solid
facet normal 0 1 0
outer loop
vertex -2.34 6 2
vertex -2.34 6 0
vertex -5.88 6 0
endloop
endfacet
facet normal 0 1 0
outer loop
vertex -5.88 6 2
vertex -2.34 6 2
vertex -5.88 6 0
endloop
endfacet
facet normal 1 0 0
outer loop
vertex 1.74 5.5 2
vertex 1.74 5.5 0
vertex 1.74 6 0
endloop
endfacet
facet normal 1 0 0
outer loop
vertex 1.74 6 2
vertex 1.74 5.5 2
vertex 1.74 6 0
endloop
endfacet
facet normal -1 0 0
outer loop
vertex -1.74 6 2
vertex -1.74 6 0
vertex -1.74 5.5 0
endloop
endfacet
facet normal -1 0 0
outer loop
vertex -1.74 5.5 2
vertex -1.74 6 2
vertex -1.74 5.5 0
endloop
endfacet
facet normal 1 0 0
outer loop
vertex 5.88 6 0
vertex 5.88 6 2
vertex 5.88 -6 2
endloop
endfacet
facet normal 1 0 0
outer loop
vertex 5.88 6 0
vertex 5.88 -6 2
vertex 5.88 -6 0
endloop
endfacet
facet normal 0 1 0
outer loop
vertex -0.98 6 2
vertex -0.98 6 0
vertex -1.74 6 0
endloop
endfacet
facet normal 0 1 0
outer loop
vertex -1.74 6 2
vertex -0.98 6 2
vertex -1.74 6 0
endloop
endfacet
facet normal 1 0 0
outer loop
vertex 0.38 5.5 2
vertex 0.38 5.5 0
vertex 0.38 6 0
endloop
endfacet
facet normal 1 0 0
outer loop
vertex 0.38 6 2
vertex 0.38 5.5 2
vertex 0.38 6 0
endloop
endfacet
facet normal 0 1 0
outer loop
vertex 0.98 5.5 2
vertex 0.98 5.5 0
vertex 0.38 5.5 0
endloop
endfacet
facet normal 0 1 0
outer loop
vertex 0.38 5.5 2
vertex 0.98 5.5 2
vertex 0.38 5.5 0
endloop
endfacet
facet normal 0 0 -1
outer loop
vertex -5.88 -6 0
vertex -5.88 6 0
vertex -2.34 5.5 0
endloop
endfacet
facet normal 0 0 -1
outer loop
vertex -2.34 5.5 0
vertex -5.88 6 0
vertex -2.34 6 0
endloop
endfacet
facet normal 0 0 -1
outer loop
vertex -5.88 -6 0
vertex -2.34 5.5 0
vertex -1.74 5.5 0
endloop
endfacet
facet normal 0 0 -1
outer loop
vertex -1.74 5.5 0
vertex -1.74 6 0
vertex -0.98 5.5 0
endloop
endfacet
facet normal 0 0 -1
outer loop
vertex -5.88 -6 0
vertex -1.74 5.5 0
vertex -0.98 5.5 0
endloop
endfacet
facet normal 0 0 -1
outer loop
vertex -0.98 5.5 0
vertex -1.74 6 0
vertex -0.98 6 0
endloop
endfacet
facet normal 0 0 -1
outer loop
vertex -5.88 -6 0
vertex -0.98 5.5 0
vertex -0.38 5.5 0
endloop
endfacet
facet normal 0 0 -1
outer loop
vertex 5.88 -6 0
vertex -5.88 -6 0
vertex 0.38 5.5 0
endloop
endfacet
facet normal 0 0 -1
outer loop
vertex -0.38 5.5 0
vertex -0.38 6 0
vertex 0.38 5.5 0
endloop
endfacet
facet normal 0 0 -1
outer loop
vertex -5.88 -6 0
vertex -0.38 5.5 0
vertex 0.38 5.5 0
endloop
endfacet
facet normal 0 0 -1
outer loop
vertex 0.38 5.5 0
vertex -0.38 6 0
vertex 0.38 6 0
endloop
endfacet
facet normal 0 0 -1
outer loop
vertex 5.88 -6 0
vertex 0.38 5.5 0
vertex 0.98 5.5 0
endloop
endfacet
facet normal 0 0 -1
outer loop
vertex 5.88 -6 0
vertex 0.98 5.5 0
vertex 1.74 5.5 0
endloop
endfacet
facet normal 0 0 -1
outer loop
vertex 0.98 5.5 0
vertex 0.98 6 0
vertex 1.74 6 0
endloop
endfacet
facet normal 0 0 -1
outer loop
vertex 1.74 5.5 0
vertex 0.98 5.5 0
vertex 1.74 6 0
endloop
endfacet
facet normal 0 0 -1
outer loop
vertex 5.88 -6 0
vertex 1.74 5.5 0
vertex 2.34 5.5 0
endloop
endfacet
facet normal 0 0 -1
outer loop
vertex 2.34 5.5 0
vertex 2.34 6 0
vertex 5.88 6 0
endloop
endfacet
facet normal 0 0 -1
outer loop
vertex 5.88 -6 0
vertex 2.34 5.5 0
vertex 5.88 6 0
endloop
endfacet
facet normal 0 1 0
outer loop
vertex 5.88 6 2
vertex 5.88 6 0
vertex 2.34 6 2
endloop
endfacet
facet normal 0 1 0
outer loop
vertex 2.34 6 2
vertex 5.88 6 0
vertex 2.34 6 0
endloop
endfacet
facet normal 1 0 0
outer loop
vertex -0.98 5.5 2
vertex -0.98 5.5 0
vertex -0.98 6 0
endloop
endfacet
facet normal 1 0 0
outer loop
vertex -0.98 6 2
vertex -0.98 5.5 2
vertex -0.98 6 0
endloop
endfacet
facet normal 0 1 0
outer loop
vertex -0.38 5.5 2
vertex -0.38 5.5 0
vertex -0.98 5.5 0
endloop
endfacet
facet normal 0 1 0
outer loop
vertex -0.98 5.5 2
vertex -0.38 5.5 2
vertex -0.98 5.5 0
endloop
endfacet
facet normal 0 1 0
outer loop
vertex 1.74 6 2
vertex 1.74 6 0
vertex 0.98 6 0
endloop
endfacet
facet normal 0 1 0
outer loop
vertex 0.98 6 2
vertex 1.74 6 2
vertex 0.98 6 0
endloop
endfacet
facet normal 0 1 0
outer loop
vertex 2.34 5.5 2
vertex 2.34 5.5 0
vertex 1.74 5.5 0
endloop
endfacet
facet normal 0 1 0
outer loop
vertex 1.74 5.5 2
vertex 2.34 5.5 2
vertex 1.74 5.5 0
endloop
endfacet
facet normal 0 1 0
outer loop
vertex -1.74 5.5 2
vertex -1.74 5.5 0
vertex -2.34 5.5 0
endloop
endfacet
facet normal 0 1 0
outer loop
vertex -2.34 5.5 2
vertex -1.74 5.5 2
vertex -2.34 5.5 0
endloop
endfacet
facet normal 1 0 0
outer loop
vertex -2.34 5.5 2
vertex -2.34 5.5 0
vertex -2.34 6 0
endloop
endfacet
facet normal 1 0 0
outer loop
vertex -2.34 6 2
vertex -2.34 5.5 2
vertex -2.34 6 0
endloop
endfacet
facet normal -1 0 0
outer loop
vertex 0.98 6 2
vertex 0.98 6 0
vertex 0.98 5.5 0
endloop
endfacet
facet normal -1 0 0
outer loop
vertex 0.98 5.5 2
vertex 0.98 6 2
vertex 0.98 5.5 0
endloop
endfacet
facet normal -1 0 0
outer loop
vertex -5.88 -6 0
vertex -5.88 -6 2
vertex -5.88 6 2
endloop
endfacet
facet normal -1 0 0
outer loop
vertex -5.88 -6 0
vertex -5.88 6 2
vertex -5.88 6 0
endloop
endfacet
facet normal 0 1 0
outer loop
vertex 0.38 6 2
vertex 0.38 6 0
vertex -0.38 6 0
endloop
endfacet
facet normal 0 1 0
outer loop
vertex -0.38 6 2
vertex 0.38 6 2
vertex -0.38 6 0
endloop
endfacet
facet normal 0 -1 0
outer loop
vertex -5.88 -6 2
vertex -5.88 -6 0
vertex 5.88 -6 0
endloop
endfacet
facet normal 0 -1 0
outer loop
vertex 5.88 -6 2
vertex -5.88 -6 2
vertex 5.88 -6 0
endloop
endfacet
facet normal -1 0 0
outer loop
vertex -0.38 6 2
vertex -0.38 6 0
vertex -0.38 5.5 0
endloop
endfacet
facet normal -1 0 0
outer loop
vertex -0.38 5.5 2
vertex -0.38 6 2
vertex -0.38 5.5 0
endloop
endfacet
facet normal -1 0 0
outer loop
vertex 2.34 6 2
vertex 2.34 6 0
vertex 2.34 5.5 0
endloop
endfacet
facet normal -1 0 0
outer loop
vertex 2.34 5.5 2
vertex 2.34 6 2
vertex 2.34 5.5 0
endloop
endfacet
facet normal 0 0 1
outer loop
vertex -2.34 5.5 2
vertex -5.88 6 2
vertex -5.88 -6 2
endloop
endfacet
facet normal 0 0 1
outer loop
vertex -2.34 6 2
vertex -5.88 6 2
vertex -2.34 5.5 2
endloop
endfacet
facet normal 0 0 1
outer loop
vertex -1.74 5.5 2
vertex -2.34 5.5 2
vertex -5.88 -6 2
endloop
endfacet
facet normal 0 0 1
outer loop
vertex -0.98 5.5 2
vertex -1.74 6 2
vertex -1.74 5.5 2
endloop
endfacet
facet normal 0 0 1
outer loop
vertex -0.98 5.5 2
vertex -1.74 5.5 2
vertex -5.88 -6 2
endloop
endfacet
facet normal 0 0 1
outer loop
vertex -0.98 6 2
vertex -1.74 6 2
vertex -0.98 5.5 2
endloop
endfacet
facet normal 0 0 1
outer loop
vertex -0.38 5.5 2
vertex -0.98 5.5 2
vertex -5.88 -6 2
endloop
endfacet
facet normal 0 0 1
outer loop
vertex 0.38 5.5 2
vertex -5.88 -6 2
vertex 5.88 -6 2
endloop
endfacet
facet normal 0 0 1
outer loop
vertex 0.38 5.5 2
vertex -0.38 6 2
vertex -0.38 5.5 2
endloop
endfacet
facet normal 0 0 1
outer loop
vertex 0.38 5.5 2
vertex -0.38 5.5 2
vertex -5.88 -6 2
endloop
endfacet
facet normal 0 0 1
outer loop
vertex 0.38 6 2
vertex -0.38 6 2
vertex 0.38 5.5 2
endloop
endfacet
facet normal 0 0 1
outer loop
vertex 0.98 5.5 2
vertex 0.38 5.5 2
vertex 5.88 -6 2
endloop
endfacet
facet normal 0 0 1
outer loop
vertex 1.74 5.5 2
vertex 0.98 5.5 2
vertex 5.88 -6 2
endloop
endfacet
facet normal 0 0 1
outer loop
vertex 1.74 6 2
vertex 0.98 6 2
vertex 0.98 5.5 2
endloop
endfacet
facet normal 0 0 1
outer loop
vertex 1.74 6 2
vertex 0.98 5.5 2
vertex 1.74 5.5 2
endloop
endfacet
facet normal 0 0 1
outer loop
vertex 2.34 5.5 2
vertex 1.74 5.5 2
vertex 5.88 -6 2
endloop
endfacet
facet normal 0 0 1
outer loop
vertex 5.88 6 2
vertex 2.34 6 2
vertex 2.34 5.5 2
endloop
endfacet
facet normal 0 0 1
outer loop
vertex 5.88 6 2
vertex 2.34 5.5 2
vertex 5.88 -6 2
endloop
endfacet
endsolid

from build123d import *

# Parameters (mm, degrees)
SKETCH1_R               = 1.5
BOSS_EXTRUDE1_DEPTH     = 2
CUT_EXTRUDE2_DEPTH      = 17.07015868
CUT_EXTRUDE2_DEPTH_BACK = 17.07015868
SKETCH3_W               = 4.62
SKETCH3_H               = 2.672478053
SKETCH3_H_2             = 3.0633703


with BuildPart() as part:
    # Sketch1 → Boss-Extrude1 (new body)
    with BuildSketch(Plane.XY):
        Polygon((-10.5, -6), (10.5, -6), (10.5, 6), (2.34, 6), (2.34, 5.5), (1.74, 5.5), (1.74, 6), (0.98, 6), (0.98, 5.5), (0.38, 5.5), (0.38, 6), (-0.38, 6), (-0.38, 5.5), (-0.98, 5.5), (-0.98, 6), (-1.74, 6), (-1.74, 5.5), (-2.34, 5.5), (-2.34, 6), (-10.5, 6), align=None)
        with Locations((8.5, -2.5)):
            Circle(SKETCH1_R, mode=Mode.SUBTRACT)
        with Locations((-8.5, -2.5)):
            Circle(SKETCH1_R, mode=Mode.SUBTRACT)
    extrude(amount=BOSS_EXTRUDE1_DEPTH)

    # Sketch3 → Cut-Extrude2 (cut, two sides: drawn at the far end of the back side and taken through both)
    with BuildSketch(Plane(origin=(0, 6, 0), x_dir=(1, 0, 0), z_dir=(0, 1, 0)).offset(-CUT_EXTRUDE2_DEPTH_BACK)):
        with Locations((8.19, -1.336239027)):
            Rectangle(SKETCH3_W, SKETCH3_H)
        with Locations((-8.19, -1.53168515)):
            Rectangle(SKETCH3_W, SKETCH3_H_2)
    extrude(amount=CUT_EXTRUDE2_DEPTH + CUT_EXTRUDE2_DEPTH_BACK, mode=Mode.SUBTRACT)


solid = part.part
